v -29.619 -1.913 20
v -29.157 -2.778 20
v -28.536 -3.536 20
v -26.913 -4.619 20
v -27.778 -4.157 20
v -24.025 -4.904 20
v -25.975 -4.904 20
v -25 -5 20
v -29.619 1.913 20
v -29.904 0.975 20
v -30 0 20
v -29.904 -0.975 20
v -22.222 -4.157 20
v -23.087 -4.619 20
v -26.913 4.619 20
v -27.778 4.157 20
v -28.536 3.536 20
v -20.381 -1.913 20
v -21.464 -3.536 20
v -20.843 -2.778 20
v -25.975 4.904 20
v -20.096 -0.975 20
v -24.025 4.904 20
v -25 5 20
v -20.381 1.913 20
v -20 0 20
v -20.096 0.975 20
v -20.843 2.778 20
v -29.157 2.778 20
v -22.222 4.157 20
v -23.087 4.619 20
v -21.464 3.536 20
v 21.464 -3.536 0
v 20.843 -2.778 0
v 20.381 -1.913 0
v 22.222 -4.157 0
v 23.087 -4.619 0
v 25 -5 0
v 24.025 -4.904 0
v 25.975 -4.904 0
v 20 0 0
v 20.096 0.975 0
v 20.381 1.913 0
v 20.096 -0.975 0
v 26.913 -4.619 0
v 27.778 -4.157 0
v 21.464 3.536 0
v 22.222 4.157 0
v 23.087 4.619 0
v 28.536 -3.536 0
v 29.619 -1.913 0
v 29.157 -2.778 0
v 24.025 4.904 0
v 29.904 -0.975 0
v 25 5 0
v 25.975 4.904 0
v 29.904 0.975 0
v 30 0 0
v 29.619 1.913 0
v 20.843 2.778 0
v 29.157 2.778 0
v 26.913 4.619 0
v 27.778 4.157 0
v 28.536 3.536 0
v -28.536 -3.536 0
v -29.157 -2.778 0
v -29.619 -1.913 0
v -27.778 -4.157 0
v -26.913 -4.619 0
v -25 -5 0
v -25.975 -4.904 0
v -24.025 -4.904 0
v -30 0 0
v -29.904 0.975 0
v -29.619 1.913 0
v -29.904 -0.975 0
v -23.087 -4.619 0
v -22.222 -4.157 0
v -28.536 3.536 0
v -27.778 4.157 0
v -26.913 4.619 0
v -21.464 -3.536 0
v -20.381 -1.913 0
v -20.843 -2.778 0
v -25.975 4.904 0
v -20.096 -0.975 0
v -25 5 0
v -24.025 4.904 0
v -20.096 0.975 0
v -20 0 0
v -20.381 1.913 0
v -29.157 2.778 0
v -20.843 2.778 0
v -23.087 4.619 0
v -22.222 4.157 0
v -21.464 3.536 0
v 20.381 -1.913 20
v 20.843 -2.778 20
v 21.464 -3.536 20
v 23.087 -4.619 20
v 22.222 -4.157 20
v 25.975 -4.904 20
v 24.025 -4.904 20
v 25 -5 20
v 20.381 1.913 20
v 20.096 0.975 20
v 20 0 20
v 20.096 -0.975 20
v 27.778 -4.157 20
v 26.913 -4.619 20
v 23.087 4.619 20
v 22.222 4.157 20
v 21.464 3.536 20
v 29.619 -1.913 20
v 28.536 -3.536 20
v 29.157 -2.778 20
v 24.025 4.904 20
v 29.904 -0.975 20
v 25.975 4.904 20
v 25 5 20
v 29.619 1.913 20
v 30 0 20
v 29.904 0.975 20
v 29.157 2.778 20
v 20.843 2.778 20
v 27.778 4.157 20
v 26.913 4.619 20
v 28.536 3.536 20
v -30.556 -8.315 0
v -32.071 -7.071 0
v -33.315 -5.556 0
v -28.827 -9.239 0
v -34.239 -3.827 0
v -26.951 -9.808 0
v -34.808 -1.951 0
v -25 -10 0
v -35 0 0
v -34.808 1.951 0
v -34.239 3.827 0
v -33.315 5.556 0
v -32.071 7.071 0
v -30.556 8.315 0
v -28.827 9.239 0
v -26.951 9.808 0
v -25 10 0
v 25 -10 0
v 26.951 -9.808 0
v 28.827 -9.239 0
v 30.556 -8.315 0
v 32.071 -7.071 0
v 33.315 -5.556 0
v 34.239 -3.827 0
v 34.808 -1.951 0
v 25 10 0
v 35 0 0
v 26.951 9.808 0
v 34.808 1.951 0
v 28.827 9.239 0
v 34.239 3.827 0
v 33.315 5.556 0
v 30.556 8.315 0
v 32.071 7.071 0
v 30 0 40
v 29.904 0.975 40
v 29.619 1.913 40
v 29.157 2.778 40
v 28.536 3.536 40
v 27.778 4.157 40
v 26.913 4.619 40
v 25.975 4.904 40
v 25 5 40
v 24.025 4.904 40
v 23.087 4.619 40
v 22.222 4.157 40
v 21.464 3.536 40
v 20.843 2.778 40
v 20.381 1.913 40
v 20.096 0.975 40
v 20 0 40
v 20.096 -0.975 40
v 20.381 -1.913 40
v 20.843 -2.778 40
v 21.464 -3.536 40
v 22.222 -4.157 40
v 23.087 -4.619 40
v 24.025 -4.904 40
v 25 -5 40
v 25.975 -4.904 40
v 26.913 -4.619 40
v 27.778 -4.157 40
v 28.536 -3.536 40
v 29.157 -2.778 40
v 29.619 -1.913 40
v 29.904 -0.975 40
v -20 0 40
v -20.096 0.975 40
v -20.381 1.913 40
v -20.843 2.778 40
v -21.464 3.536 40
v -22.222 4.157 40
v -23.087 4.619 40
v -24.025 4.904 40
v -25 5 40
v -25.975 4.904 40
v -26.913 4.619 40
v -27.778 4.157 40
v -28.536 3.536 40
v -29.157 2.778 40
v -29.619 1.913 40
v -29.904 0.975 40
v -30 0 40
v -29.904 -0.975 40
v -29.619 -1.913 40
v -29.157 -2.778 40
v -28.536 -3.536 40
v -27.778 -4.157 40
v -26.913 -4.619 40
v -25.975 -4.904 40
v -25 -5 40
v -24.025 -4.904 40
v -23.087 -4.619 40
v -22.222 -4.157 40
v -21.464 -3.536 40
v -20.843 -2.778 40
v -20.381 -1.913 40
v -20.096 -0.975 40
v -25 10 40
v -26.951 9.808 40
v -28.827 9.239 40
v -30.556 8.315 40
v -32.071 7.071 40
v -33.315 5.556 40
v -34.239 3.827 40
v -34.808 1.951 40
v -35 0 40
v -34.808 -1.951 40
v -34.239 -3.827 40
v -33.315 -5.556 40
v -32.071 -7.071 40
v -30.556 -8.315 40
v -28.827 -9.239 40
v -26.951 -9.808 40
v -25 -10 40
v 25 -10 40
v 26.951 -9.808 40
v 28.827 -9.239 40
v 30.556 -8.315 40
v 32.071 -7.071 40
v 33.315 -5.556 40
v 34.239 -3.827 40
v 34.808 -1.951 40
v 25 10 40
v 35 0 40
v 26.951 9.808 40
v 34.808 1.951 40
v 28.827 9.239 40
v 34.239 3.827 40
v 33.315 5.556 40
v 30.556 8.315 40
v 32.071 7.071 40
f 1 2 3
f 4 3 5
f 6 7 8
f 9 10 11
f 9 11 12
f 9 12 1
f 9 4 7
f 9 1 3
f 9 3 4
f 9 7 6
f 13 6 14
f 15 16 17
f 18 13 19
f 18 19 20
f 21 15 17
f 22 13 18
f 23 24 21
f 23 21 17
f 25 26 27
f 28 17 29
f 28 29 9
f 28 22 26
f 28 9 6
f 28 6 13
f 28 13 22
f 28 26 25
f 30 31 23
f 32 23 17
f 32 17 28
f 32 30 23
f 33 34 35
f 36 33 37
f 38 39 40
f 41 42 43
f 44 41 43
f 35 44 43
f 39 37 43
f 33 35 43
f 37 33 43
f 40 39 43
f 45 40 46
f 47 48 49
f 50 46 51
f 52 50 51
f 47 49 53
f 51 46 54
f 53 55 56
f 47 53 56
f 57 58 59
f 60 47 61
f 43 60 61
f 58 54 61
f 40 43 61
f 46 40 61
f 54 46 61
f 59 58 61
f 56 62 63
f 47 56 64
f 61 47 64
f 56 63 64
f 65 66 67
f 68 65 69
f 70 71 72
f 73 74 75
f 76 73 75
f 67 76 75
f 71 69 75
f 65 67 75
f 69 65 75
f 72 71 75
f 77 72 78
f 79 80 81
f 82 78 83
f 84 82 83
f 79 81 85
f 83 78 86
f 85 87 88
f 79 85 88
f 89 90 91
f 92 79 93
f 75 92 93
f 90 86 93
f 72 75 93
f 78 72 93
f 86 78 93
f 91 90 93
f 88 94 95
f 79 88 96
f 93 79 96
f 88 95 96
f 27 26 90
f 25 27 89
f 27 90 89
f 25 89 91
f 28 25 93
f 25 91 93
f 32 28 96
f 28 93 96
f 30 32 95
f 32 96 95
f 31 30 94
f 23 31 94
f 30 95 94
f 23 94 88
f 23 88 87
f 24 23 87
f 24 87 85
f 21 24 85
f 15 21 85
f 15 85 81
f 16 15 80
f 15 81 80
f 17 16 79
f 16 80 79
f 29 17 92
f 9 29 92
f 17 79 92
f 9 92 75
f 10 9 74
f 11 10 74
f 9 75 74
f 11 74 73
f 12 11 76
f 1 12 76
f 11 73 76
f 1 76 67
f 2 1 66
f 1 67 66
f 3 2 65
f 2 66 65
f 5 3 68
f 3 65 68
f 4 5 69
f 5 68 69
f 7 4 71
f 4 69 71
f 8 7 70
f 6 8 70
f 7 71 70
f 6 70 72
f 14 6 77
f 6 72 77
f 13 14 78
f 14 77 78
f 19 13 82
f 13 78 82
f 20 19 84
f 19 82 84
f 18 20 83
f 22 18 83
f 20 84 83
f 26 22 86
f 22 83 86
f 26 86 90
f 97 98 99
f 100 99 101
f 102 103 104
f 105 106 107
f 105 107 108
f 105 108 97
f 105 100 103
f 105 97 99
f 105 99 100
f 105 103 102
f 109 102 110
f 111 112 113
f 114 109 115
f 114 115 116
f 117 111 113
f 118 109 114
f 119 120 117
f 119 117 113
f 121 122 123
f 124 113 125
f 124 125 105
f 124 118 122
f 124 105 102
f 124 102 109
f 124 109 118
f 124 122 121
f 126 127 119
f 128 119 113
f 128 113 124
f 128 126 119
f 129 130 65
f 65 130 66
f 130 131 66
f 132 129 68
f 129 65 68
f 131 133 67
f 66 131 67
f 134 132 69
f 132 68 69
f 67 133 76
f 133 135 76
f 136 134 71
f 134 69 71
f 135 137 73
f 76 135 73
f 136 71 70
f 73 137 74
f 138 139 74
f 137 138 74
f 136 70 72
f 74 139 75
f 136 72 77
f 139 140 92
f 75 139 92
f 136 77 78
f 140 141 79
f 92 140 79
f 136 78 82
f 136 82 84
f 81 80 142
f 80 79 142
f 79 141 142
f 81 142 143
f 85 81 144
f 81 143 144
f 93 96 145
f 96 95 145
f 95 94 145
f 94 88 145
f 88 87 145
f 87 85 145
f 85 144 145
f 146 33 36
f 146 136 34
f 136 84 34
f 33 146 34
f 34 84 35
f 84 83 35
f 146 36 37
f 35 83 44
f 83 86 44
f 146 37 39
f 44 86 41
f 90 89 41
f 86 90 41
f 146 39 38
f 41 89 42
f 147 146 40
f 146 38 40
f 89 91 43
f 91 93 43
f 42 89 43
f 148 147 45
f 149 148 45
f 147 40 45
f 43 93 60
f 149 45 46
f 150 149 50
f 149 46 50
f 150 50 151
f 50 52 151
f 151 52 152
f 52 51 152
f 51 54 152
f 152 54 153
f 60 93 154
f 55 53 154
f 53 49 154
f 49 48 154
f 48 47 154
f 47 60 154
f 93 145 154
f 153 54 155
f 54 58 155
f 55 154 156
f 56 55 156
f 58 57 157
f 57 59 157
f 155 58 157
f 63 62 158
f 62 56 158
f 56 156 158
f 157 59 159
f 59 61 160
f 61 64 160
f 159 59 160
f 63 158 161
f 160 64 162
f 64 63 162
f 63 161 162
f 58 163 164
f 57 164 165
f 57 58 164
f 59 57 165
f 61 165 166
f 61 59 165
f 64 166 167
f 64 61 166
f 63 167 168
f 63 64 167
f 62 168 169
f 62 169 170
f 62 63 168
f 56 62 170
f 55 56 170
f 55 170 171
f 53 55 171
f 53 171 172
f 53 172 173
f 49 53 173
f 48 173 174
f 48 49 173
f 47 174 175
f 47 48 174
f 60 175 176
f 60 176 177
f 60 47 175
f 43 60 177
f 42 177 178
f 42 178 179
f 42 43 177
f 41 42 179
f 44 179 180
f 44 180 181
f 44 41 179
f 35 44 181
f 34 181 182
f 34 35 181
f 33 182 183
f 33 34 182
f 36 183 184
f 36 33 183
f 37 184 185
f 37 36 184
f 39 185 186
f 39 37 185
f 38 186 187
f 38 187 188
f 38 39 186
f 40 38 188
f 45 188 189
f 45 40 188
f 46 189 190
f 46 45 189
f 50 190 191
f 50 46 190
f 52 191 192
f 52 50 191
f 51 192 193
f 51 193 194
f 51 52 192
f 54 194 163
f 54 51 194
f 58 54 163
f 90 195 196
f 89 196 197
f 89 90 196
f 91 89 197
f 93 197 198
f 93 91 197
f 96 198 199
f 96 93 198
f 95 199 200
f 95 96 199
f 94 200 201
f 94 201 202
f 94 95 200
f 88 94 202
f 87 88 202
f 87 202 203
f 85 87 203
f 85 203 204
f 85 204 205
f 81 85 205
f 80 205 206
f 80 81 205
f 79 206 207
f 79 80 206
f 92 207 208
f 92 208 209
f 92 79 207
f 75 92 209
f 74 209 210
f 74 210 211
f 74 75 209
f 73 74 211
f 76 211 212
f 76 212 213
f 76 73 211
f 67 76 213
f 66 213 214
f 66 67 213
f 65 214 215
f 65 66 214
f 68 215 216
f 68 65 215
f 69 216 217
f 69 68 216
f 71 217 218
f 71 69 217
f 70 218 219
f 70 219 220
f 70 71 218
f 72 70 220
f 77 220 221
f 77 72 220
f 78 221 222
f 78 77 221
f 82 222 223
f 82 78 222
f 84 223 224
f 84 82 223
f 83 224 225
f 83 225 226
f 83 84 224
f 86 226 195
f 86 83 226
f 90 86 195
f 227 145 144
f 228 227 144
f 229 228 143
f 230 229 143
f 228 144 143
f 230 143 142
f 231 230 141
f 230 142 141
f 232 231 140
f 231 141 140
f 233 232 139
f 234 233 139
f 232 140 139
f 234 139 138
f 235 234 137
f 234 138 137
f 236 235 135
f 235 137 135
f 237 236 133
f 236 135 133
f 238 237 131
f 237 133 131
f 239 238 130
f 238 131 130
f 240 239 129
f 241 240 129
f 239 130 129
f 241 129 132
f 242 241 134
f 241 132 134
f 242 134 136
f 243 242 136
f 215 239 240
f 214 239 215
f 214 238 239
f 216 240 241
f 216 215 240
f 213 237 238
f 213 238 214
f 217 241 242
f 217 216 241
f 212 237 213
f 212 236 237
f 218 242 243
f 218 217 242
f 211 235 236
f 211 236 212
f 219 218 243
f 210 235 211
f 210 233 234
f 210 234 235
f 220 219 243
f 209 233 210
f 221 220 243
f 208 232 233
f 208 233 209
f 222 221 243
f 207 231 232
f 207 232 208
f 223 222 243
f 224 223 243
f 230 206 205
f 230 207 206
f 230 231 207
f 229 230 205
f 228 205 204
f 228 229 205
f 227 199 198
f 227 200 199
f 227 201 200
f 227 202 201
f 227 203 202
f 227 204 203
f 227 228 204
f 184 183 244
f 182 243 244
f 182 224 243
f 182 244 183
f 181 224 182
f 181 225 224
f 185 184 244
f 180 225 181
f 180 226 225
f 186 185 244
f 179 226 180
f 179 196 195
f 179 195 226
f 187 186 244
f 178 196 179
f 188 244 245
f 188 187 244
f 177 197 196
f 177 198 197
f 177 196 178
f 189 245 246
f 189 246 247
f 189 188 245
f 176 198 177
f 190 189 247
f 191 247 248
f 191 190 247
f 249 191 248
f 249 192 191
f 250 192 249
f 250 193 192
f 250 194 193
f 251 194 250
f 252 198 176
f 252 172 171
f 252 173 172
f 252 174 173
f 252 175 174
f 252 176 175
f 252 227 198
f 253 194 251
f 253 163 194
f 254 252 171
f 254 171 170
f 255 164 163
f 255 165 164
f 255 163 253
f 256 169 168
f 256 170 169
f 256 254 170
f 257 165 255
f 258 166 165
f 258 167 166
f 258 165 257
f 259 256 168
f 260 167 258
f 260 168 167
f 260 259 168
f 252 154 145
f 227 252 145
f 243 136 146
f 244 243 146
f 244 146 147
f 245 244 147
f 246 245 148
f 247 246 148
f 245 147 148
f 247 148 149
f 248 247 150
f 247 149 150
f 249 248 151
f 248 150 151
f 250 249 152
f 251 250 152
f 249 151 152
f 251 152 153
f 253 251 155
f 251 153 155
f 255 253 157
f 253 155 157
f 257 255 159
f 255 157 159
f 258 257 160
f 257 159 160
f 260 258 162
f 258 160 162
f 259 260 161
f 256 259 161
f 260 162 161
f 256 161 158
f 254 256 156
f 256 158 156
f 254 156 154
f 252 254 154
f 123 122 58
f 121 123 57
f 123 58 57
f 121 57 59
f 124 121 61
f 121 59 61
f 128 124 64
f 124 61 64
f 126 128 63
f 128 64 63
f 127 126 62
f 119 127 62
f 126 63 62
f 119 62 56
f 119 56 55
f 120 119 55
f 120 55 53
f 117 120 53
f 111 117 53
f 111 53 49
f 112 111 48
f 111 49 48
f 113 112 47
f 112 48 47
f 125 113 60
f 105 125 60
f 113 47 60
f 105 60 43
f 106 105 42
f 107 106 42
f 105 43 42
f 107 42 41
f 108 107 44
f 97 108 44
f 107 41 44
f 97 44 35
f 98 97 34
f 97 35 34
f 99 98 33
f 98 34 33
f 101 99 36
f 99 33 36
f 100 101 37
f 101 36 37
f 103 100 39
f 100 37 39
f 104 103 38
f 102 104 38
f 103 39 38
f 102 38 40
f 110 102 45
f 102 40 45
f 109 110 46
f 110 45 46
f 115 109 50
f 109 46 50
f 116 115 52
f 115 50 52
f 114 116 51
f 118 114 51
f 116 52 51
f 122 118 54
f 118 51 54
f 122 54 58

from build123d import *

# Parameters (mm, degrees)
F0_R     = 5
F1_DEPTH = 20
F2_DEPTH = 20
F3_DEPTH = 40


with BuildPart() as f1:
    # F0 (on Top) → F1 (new body)
    with BuildSketch(Plane.XY):
        with Locations((25, 0)):
            Circle(F0_R)
    extrude(amount=F1_DEPTH)


with BuildPart() as f2:
    # F0 (on Top) → F2 (new body)
    with BuildSketch(Plane.XY):
        with Locations((-25, 0)):
            Circle(F0_R)
    extrude(amount=F2_DEPTH)


with BuildPart() as f3:
    # F0 (on Top) → F3 (new body)
    with BuildSketch(Plane.XY):
        with BuildLine():
            ThreePointArc((-25, 10), (-35, 0), (-25, -10))
            Line((-25, -10), (25, -10))
            ThreePointArc((25, -10), (35, 0), (25, 10))
            Line((25, 10), (-25, 10))
        make_face()
        with Locations((-25, 0)):
            Circle(F0_R, mode=Mode.SUBTRACT)
        with Locations((25, 0)):
            Circle(F0_R, mode=Mode.SUBTRACT)
    extrude(amount=F3_DEPTH)


solid = Compound([f1.part, f2.part, f3.part])
